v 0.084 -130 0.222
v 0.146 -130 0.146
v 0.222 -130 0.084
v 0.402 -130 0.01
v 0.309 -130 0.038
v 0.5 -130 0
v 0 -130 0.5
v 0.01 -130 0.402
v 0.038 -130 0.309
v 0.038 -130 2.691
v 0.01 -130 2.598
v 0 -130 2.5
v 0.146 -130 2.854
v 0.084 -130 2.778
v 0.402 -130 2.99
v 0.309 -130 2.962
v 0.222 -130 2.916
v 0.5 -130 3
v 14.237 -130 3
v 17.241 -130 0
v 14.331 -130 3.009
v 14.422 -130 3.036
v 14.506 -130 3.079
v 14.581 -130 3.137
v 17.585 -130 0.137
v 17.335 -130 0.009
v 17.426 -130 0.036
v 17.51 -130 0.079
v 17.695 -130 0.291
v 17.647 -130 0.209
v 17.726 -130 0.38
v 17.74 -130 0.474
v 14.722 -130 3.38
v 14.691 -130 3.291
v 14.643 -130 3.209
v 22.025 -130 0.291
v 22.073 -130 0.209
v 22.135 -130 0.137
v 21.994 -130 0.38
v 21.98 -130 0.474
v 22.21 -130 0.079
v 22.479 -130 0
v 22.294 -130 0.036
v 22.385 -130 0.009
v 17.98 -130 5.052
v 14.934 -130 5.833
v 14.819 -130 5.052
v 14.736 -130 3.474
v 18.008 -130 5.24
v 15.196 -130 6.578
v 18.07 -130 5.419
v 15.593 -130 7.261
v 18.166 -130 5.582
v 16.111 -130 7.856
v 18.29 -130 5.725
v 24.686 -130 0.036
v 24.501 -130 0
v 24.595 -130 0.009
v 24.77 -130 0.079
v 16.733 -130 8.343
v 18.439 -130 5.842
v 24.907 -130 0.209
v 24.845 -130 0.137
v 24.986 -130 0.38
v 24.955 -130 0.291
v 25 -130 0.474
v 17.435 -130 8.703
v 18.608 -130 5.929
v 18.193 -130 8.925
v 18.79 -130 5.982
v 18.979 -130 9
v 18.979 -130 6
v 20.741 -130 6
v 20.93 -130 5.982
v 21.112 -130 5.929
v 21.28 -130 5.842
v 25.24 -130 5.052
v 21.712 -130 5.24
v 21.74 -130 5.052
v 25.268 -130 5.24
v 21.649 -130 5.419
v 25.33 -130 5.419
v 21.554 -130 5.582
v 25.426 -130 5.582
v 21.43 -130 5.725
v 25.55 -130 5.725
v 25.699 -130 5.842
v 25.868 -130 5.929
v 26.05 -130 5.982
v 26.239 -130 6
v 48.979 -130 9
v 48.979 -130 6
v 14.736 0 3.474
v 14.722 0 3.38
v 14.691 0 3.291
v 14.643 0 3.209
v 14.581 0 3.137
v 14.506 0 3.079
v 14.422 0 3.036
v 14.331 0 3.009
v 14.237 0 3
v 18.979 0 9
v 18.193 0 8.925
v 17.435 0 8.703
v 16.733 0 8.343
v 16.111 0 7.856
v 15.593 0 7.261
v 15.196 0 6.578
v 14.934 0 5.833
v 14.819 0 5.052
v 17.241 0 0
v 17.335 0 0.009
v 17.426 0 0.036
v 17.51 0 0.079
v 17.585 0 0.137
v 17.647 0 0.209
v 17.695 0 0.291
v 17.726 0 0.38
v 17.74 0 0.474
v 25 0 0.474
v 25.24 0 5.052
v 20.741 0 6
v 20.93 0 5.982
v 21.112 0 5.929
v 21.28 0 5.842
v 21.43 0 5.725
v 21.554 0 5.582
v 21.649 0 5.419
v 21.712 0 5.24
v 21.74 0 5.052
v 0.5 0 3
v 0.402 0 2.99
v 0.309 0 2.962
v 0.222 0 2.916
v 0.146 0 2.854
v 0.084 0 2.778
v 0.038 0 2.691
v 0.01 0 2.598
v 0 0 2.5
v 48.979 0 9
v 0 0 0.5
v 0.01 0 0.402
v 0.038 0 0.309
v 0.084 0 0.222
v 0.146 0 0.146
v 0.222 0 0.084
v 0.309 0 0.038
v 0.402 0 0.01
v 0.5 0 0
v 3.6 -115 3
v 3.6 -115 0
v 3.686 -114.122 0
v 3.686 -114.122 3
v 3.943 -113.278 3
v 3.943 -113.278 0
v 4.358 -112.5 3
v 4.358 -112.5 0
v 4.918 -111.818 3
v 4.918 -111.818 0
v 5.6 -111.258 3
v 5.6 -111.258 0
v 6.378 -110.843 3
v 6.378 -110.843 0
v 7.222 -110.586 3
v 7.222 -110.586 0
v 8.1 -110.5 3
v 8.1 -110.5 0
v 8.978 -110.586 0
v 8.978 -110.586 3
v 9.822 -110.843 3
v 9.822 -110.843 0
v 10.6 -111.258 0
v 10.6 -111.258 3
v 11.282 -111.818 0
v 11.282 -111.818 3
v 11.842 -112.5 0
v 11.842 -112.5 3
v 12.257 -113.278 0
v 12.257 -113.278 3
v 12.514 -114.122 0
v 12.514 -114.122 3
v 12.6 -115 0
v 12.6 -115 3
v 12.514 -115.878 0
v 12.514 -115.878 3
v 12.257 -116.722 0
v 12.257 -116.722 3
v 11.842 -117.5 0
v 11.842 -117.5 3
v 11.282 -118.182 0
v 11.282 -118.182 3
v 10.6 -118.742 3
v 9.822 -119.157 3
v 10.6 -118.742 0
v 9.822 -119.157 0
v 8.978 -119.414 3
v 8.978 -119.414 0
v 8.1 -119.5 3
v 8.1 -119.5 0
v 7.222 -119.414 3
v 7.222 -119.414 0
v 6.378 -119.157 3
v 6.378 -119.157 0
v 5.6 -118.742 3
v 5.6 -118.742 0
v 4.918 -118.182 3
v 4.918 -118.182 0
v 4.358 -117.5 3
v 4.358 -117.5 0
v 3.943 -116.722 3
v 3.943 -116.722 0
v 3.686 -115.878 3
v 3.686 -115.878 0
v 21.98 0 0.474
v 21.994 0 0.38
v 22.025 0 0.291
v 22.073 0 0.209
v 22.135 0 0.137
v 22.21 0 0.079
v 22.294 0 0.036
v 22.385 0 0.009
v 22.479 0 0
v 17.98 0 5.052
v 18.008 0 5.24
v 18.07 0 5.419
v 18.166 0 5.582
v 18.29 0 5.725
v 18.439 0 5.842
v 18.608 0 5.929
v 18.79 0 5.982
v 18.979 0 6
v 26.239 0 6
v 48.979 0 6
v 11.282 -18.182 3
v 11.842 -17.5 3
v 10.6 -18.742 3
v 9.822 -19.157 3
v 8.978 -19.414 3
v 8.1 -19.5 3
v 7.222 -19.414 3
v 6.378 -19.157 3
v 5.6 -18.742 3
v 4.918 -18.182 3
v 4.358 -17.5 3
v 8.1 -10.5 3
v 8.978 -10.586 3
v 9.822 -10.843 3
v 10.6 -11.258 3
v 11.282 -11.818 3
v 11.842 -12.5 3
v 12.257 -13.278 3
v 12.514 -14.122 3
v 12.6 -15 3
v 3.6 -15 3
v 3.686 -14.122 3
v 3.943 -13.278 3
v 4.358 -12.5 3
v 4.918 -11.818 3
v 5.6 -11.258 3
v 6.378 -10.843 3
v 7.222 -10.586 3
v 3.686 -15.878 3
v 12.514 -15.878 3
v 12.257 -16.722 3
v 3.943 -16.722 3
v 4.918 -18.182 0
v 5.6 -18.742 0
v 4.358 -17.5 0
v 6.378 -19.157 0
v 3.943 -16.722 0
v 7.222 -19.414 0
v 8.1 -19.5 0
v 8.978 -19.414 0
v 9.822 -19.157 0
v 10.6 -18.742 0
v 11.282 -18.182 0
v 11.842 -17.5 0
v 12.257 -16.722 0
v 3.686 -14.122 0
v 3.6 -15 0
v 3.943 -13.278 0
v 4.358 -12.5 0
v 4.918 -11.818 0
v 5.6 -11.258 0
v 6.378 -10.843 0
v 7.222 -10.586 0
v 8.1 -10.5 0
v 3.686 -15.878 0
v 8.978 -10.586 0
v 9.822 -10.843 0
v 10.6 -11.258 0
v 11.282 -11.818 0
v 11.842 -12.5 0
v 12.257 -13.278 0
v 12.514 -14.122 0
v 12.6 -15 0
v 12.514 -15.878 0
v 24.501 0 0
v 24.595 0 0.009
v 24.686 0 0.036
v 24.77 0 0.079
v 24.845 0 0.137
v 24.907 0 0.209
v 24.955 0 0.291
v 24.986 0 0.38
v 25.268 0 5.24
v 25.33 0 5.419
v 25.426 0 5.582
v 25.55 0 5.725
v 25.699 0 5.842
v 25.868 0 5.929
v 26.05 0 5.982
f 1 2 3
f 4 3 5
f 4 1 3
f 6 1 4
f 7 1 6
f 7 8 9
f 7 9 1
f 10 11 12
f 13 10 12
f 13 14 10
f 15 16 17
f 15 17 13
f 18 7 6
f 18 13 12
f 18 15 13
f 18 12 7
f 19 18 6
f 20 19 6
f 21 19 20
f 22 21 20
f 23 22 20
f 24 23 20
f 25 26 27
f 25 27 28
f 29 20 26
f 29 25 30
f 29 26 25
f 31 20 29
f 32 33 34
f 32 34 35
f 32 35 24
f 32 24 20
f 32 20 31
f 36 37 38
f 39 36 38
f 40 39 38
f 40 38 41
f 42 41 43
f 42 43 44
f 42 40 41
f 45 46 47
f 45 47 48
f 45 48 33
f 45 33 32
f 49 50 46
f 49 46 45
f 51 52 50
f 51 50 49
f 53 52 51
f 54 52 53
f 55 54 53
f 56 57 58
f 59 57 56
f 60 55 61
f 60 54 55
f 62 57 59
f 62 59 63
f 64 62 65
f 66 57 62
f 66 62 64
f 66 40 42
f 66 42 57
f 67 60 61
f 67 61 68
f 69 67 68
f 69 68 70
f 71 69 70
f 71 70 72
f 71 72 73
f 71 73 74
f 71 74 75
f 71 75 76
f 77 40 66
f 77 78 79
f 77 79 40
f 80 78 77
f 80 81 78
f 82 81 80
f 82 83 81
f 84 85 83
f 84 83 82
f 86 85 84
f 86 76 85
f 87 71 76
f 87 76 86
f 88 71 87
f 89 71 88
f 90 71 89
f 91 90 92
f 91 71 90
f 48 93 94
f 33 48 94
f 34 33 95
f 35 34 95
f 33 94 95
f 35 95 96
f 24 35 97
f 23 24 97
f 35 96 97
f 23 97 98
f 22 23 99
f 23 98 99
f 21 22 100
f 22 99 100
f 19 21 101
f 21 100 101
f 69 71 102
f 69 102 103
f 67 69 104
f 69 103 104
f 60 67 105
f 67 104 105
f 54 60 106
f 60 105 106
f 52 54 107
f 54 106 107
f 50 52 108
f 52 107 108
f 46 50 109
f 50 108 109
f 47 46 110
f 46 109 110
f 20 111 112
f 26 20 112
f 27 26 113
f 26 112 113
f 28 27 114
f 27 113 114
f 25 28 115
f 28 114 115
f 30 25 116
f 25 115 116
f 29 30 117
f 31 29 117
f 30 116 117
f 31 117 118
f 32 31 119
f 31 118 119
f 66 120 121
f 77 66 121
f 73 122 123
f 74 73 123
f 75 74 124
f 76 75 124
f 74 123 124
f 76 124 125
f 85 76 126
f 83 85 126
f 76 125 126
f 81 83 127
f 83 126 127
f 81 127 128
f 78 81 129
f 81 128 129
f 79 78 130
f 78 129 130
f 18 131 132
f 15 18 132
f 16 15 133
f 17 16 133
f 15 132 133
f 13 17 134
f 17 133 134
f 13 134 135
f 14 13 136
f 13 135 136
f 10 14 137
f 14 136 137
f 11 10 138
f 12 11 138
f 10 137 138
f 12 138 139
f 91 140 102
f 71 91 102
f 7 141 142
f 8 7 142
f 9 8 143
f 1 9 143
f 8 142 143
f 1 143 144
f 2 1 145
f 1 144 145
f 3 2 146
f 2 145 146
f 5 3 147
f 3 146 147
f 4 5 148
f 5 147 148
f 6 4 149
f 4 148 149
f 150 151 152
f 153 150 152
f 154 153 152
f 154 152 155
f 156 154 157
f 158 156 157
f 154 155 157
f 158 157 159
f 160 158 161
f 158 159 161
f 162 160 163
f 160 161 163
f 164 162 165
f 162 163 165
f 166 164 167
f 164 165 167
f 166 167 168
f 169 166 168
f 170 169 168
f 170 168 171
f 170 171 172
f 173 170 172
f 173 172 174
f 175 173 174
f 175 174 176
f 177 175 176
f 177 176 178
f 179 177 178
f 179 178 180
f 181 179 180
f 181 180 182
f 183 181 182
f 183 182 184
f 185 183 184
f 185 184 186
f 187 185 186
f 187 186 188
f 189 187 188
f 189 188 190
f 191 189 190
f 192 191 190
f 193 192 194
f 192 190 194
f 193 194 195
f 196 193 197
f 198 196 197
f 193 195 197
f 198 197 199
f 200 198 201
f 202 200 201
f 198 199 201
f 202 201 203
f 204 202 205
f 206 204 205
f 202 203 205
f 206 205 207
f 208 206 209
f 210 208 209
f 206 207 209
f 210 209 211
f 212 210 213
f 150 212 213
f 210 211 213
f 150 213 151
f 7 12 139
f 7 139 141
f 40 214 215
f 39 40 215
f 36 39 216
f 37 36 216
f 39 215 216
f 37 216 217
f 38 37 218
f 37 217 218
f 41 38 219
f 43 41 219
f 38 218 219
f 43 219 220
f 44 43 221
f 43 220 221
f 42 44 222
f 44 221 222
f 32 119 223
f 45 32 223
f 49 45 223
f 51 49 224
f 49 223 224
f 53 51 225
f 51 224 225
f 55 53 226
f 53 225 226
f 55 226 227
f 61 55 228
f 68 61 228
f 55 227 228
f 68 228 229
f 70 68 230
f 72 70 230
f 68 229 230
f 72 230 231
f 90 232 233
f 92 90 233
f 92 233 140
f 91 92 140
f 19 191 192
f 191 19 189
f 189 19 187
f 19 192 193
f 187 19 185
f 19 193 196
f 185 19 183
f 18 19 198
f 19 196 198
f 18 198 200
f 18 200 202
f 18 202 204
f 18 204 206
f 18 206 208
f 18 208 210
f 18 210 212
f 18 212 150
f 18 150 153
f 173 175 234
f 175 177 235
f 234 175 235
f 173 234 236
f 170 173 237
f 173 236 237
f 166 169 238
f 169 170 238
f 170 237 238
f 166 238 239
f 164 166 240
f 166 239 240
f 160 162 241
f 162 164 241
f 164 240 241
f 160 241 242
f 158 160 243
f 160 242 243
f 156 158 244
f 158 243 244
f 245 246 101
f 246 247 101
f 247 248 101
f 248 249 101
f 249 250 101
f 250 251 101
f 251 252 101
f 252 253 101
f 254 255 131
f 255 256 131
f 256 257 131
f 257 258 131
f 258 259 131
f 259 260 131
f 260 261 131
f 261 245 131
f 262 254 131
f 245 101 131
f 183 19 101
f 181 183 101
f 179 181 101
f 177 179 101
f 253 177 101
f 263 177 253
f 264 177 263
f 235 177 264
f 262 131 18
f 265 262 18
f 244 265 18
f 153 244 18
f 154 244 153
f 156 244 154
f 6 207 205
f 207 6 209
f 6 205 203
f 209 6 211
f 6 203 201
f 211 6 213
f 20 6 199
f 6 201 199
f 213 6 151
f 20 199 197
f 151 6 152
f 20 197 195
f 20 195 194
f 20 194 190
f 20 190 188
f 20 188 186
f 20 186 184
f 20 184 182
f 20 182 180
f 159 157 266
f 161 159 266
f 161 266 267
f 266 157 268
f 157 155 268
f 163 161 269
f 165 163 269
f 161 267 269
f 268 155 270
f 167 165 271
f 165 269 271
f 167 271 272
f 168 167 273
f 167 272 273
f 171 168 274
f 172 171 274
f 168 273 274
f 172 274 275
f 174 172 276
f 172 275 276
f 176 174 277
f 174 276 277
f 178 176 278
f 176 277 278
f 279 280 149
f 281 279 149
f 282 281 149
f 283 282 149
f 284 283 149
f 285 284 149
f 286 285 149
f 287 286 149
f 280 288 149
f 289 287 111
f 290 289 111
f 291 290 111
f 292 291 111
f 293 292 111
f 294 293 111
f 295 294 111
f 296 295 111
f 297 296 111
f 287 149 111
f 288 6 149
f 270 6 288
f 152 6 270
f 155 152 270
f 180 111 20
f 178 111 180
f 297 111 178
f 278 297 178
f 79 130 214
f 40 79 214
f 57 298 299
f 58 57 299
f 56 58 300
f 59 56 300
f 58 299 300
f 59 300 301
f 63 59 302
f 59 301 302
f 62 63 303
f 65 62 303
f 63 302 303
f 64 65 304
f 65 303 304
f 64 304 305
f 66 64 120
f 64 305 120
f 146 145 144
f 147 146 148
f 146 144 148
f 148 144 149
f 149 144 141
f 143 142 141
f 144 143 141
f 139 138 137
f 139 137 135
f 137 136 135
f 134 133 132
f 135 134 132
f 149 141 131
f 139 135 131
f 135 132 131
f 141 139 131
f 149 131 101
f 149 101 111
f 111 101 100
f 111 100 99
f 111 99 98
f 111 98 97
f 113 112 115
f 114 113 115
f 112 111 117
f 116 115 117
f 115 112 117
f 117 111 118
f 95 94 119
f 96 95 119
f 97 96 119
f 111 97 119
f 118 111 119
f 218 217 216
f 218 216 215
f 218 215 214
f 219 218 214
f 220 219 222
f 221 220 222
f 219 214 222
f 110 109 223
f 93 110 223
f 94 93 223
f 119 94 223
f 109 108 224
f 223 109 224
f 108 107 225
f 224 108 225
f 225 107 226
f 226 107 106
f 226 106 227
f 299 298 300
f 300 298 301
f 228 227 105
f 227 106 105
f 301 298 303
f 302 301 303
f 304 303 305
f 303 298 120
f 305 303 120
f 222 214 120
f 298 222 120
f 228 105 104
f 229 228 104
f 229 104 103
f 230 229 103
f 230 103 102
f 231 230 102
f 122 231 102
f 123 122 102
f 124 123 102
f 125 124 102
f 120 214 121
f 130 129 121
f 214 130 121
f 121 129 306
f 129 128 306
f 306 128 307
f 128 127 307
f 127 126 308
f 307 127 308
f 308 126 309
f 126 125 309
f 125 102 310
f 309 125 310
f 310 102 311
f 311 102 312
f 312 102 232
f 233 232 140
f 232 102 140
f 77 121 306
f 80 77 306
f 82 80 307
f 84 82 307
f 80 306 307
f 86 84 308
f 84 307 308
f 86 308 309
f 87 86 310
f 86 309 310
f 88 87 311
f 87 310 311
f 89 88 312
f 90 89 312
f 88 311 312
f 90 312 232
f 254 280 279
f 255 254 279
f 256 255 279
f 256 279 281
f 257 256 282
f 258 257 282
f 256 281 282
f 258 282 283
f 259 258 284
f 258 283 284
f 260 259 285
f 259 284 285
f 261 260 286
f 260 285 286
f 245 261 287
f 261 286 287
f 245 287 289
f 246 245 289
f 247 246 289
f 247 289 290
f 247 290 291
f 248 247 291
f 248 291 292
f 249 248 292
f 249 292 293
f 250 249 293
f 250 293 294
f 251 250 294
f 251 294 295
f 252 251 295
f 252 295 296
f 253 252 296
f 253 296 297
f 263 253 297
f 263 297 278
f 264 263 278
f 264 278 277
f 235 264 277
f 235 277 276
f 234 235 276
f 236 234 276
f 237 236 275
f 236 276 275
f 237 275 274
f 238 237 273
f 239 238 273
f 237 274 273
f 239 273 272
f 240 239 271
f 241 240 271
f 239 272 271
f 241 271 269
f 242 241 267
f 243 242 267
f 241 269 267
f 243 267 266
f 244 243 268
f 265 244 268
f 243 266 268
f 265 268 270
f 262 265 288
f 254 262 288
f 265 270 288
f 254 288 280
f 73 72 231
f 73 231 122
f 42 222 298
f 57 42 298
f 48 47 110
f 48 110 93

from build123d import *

# Parameters (mm, degrees)
F1_DEPTH = 130
F3_D     = 9
F4_D     = 9


with BuildPart() as f1:
    # F0 (on Front) → F1 (new body)
    with BuildSketch(Plane.XZ):
        with BuildLine():
            Line((48.978579, 9), (18.978579, 9))
            ThreePointArc((18.978579, 9), (16.111115, 7.855998), (14.818609, 5.052336))
            Line((14.818609, 5.052336), (14.735883, 3.473832))
            ThreePointArc((14.735883, 3.473832), (14.580745, 3.137313), (14.236568, 3))
            Line((14.236568, 3), (0.5, 3))
            ThreePointArc((0.5, 3), (0.146447, 2.853553), (0, 2.5))
            Line((0, 2.5), (0, 0.5))
            ThreePointArc((0, 0.5), (0.146447, 0.146447), (0.5, 0))
            Line((0.5, 0), (17.240685, 0))
            ThreePointArc((17.240685, 0), (17.584863, 0.137313), (17.74, 0.473832))
            Line((17.74, 0.473832), (17.979949, 5.052336))
            ThreePointArc((17.979949, 5.052336), (18.290224, 5.725374), (18.978579, 6))
            Line((18.978579, 6), (20.74132, 6))
            ThreePointArc((20.74132, 6), (21.429674, 5.725374), (21.739949, 5.052336))
            Line((21.739949, 5.052336), (21.979898, 0.473832))
            ThreePointArc((21.979898, 0.473832), (22.135036, 0.137313), (22.479213, 0))
            Line((22.479213, 0), (24.500685, 0))
            ThreePointArc((24.500685, 0), (24.844863, 0.137313), (25, 0.473832))
            Line((25, 0.473832), (25.239949, 5.052336))
            ThreePointArc((25.239949, 5.052336), (25.550224, 5.725374), (26.238579, 6))
            Line((26.238579, 6), (48.978579, 6))
            Line((48.978579, 6), (48.978579, 9))
        make_face()
    extrude(amount=F1_DEPTH)

    # F3 (through all)
    with Locations(Plane.XY.offset(3)):
        with Locations((8.1, -15)):
            Hole(F3_D / 2)

    # F4 (through all)
    with Locations(Plane.XY.offset(3)):
        with Locations((8.1, -115)):
            Hole(F4_D / 2)


solid = f1.part
